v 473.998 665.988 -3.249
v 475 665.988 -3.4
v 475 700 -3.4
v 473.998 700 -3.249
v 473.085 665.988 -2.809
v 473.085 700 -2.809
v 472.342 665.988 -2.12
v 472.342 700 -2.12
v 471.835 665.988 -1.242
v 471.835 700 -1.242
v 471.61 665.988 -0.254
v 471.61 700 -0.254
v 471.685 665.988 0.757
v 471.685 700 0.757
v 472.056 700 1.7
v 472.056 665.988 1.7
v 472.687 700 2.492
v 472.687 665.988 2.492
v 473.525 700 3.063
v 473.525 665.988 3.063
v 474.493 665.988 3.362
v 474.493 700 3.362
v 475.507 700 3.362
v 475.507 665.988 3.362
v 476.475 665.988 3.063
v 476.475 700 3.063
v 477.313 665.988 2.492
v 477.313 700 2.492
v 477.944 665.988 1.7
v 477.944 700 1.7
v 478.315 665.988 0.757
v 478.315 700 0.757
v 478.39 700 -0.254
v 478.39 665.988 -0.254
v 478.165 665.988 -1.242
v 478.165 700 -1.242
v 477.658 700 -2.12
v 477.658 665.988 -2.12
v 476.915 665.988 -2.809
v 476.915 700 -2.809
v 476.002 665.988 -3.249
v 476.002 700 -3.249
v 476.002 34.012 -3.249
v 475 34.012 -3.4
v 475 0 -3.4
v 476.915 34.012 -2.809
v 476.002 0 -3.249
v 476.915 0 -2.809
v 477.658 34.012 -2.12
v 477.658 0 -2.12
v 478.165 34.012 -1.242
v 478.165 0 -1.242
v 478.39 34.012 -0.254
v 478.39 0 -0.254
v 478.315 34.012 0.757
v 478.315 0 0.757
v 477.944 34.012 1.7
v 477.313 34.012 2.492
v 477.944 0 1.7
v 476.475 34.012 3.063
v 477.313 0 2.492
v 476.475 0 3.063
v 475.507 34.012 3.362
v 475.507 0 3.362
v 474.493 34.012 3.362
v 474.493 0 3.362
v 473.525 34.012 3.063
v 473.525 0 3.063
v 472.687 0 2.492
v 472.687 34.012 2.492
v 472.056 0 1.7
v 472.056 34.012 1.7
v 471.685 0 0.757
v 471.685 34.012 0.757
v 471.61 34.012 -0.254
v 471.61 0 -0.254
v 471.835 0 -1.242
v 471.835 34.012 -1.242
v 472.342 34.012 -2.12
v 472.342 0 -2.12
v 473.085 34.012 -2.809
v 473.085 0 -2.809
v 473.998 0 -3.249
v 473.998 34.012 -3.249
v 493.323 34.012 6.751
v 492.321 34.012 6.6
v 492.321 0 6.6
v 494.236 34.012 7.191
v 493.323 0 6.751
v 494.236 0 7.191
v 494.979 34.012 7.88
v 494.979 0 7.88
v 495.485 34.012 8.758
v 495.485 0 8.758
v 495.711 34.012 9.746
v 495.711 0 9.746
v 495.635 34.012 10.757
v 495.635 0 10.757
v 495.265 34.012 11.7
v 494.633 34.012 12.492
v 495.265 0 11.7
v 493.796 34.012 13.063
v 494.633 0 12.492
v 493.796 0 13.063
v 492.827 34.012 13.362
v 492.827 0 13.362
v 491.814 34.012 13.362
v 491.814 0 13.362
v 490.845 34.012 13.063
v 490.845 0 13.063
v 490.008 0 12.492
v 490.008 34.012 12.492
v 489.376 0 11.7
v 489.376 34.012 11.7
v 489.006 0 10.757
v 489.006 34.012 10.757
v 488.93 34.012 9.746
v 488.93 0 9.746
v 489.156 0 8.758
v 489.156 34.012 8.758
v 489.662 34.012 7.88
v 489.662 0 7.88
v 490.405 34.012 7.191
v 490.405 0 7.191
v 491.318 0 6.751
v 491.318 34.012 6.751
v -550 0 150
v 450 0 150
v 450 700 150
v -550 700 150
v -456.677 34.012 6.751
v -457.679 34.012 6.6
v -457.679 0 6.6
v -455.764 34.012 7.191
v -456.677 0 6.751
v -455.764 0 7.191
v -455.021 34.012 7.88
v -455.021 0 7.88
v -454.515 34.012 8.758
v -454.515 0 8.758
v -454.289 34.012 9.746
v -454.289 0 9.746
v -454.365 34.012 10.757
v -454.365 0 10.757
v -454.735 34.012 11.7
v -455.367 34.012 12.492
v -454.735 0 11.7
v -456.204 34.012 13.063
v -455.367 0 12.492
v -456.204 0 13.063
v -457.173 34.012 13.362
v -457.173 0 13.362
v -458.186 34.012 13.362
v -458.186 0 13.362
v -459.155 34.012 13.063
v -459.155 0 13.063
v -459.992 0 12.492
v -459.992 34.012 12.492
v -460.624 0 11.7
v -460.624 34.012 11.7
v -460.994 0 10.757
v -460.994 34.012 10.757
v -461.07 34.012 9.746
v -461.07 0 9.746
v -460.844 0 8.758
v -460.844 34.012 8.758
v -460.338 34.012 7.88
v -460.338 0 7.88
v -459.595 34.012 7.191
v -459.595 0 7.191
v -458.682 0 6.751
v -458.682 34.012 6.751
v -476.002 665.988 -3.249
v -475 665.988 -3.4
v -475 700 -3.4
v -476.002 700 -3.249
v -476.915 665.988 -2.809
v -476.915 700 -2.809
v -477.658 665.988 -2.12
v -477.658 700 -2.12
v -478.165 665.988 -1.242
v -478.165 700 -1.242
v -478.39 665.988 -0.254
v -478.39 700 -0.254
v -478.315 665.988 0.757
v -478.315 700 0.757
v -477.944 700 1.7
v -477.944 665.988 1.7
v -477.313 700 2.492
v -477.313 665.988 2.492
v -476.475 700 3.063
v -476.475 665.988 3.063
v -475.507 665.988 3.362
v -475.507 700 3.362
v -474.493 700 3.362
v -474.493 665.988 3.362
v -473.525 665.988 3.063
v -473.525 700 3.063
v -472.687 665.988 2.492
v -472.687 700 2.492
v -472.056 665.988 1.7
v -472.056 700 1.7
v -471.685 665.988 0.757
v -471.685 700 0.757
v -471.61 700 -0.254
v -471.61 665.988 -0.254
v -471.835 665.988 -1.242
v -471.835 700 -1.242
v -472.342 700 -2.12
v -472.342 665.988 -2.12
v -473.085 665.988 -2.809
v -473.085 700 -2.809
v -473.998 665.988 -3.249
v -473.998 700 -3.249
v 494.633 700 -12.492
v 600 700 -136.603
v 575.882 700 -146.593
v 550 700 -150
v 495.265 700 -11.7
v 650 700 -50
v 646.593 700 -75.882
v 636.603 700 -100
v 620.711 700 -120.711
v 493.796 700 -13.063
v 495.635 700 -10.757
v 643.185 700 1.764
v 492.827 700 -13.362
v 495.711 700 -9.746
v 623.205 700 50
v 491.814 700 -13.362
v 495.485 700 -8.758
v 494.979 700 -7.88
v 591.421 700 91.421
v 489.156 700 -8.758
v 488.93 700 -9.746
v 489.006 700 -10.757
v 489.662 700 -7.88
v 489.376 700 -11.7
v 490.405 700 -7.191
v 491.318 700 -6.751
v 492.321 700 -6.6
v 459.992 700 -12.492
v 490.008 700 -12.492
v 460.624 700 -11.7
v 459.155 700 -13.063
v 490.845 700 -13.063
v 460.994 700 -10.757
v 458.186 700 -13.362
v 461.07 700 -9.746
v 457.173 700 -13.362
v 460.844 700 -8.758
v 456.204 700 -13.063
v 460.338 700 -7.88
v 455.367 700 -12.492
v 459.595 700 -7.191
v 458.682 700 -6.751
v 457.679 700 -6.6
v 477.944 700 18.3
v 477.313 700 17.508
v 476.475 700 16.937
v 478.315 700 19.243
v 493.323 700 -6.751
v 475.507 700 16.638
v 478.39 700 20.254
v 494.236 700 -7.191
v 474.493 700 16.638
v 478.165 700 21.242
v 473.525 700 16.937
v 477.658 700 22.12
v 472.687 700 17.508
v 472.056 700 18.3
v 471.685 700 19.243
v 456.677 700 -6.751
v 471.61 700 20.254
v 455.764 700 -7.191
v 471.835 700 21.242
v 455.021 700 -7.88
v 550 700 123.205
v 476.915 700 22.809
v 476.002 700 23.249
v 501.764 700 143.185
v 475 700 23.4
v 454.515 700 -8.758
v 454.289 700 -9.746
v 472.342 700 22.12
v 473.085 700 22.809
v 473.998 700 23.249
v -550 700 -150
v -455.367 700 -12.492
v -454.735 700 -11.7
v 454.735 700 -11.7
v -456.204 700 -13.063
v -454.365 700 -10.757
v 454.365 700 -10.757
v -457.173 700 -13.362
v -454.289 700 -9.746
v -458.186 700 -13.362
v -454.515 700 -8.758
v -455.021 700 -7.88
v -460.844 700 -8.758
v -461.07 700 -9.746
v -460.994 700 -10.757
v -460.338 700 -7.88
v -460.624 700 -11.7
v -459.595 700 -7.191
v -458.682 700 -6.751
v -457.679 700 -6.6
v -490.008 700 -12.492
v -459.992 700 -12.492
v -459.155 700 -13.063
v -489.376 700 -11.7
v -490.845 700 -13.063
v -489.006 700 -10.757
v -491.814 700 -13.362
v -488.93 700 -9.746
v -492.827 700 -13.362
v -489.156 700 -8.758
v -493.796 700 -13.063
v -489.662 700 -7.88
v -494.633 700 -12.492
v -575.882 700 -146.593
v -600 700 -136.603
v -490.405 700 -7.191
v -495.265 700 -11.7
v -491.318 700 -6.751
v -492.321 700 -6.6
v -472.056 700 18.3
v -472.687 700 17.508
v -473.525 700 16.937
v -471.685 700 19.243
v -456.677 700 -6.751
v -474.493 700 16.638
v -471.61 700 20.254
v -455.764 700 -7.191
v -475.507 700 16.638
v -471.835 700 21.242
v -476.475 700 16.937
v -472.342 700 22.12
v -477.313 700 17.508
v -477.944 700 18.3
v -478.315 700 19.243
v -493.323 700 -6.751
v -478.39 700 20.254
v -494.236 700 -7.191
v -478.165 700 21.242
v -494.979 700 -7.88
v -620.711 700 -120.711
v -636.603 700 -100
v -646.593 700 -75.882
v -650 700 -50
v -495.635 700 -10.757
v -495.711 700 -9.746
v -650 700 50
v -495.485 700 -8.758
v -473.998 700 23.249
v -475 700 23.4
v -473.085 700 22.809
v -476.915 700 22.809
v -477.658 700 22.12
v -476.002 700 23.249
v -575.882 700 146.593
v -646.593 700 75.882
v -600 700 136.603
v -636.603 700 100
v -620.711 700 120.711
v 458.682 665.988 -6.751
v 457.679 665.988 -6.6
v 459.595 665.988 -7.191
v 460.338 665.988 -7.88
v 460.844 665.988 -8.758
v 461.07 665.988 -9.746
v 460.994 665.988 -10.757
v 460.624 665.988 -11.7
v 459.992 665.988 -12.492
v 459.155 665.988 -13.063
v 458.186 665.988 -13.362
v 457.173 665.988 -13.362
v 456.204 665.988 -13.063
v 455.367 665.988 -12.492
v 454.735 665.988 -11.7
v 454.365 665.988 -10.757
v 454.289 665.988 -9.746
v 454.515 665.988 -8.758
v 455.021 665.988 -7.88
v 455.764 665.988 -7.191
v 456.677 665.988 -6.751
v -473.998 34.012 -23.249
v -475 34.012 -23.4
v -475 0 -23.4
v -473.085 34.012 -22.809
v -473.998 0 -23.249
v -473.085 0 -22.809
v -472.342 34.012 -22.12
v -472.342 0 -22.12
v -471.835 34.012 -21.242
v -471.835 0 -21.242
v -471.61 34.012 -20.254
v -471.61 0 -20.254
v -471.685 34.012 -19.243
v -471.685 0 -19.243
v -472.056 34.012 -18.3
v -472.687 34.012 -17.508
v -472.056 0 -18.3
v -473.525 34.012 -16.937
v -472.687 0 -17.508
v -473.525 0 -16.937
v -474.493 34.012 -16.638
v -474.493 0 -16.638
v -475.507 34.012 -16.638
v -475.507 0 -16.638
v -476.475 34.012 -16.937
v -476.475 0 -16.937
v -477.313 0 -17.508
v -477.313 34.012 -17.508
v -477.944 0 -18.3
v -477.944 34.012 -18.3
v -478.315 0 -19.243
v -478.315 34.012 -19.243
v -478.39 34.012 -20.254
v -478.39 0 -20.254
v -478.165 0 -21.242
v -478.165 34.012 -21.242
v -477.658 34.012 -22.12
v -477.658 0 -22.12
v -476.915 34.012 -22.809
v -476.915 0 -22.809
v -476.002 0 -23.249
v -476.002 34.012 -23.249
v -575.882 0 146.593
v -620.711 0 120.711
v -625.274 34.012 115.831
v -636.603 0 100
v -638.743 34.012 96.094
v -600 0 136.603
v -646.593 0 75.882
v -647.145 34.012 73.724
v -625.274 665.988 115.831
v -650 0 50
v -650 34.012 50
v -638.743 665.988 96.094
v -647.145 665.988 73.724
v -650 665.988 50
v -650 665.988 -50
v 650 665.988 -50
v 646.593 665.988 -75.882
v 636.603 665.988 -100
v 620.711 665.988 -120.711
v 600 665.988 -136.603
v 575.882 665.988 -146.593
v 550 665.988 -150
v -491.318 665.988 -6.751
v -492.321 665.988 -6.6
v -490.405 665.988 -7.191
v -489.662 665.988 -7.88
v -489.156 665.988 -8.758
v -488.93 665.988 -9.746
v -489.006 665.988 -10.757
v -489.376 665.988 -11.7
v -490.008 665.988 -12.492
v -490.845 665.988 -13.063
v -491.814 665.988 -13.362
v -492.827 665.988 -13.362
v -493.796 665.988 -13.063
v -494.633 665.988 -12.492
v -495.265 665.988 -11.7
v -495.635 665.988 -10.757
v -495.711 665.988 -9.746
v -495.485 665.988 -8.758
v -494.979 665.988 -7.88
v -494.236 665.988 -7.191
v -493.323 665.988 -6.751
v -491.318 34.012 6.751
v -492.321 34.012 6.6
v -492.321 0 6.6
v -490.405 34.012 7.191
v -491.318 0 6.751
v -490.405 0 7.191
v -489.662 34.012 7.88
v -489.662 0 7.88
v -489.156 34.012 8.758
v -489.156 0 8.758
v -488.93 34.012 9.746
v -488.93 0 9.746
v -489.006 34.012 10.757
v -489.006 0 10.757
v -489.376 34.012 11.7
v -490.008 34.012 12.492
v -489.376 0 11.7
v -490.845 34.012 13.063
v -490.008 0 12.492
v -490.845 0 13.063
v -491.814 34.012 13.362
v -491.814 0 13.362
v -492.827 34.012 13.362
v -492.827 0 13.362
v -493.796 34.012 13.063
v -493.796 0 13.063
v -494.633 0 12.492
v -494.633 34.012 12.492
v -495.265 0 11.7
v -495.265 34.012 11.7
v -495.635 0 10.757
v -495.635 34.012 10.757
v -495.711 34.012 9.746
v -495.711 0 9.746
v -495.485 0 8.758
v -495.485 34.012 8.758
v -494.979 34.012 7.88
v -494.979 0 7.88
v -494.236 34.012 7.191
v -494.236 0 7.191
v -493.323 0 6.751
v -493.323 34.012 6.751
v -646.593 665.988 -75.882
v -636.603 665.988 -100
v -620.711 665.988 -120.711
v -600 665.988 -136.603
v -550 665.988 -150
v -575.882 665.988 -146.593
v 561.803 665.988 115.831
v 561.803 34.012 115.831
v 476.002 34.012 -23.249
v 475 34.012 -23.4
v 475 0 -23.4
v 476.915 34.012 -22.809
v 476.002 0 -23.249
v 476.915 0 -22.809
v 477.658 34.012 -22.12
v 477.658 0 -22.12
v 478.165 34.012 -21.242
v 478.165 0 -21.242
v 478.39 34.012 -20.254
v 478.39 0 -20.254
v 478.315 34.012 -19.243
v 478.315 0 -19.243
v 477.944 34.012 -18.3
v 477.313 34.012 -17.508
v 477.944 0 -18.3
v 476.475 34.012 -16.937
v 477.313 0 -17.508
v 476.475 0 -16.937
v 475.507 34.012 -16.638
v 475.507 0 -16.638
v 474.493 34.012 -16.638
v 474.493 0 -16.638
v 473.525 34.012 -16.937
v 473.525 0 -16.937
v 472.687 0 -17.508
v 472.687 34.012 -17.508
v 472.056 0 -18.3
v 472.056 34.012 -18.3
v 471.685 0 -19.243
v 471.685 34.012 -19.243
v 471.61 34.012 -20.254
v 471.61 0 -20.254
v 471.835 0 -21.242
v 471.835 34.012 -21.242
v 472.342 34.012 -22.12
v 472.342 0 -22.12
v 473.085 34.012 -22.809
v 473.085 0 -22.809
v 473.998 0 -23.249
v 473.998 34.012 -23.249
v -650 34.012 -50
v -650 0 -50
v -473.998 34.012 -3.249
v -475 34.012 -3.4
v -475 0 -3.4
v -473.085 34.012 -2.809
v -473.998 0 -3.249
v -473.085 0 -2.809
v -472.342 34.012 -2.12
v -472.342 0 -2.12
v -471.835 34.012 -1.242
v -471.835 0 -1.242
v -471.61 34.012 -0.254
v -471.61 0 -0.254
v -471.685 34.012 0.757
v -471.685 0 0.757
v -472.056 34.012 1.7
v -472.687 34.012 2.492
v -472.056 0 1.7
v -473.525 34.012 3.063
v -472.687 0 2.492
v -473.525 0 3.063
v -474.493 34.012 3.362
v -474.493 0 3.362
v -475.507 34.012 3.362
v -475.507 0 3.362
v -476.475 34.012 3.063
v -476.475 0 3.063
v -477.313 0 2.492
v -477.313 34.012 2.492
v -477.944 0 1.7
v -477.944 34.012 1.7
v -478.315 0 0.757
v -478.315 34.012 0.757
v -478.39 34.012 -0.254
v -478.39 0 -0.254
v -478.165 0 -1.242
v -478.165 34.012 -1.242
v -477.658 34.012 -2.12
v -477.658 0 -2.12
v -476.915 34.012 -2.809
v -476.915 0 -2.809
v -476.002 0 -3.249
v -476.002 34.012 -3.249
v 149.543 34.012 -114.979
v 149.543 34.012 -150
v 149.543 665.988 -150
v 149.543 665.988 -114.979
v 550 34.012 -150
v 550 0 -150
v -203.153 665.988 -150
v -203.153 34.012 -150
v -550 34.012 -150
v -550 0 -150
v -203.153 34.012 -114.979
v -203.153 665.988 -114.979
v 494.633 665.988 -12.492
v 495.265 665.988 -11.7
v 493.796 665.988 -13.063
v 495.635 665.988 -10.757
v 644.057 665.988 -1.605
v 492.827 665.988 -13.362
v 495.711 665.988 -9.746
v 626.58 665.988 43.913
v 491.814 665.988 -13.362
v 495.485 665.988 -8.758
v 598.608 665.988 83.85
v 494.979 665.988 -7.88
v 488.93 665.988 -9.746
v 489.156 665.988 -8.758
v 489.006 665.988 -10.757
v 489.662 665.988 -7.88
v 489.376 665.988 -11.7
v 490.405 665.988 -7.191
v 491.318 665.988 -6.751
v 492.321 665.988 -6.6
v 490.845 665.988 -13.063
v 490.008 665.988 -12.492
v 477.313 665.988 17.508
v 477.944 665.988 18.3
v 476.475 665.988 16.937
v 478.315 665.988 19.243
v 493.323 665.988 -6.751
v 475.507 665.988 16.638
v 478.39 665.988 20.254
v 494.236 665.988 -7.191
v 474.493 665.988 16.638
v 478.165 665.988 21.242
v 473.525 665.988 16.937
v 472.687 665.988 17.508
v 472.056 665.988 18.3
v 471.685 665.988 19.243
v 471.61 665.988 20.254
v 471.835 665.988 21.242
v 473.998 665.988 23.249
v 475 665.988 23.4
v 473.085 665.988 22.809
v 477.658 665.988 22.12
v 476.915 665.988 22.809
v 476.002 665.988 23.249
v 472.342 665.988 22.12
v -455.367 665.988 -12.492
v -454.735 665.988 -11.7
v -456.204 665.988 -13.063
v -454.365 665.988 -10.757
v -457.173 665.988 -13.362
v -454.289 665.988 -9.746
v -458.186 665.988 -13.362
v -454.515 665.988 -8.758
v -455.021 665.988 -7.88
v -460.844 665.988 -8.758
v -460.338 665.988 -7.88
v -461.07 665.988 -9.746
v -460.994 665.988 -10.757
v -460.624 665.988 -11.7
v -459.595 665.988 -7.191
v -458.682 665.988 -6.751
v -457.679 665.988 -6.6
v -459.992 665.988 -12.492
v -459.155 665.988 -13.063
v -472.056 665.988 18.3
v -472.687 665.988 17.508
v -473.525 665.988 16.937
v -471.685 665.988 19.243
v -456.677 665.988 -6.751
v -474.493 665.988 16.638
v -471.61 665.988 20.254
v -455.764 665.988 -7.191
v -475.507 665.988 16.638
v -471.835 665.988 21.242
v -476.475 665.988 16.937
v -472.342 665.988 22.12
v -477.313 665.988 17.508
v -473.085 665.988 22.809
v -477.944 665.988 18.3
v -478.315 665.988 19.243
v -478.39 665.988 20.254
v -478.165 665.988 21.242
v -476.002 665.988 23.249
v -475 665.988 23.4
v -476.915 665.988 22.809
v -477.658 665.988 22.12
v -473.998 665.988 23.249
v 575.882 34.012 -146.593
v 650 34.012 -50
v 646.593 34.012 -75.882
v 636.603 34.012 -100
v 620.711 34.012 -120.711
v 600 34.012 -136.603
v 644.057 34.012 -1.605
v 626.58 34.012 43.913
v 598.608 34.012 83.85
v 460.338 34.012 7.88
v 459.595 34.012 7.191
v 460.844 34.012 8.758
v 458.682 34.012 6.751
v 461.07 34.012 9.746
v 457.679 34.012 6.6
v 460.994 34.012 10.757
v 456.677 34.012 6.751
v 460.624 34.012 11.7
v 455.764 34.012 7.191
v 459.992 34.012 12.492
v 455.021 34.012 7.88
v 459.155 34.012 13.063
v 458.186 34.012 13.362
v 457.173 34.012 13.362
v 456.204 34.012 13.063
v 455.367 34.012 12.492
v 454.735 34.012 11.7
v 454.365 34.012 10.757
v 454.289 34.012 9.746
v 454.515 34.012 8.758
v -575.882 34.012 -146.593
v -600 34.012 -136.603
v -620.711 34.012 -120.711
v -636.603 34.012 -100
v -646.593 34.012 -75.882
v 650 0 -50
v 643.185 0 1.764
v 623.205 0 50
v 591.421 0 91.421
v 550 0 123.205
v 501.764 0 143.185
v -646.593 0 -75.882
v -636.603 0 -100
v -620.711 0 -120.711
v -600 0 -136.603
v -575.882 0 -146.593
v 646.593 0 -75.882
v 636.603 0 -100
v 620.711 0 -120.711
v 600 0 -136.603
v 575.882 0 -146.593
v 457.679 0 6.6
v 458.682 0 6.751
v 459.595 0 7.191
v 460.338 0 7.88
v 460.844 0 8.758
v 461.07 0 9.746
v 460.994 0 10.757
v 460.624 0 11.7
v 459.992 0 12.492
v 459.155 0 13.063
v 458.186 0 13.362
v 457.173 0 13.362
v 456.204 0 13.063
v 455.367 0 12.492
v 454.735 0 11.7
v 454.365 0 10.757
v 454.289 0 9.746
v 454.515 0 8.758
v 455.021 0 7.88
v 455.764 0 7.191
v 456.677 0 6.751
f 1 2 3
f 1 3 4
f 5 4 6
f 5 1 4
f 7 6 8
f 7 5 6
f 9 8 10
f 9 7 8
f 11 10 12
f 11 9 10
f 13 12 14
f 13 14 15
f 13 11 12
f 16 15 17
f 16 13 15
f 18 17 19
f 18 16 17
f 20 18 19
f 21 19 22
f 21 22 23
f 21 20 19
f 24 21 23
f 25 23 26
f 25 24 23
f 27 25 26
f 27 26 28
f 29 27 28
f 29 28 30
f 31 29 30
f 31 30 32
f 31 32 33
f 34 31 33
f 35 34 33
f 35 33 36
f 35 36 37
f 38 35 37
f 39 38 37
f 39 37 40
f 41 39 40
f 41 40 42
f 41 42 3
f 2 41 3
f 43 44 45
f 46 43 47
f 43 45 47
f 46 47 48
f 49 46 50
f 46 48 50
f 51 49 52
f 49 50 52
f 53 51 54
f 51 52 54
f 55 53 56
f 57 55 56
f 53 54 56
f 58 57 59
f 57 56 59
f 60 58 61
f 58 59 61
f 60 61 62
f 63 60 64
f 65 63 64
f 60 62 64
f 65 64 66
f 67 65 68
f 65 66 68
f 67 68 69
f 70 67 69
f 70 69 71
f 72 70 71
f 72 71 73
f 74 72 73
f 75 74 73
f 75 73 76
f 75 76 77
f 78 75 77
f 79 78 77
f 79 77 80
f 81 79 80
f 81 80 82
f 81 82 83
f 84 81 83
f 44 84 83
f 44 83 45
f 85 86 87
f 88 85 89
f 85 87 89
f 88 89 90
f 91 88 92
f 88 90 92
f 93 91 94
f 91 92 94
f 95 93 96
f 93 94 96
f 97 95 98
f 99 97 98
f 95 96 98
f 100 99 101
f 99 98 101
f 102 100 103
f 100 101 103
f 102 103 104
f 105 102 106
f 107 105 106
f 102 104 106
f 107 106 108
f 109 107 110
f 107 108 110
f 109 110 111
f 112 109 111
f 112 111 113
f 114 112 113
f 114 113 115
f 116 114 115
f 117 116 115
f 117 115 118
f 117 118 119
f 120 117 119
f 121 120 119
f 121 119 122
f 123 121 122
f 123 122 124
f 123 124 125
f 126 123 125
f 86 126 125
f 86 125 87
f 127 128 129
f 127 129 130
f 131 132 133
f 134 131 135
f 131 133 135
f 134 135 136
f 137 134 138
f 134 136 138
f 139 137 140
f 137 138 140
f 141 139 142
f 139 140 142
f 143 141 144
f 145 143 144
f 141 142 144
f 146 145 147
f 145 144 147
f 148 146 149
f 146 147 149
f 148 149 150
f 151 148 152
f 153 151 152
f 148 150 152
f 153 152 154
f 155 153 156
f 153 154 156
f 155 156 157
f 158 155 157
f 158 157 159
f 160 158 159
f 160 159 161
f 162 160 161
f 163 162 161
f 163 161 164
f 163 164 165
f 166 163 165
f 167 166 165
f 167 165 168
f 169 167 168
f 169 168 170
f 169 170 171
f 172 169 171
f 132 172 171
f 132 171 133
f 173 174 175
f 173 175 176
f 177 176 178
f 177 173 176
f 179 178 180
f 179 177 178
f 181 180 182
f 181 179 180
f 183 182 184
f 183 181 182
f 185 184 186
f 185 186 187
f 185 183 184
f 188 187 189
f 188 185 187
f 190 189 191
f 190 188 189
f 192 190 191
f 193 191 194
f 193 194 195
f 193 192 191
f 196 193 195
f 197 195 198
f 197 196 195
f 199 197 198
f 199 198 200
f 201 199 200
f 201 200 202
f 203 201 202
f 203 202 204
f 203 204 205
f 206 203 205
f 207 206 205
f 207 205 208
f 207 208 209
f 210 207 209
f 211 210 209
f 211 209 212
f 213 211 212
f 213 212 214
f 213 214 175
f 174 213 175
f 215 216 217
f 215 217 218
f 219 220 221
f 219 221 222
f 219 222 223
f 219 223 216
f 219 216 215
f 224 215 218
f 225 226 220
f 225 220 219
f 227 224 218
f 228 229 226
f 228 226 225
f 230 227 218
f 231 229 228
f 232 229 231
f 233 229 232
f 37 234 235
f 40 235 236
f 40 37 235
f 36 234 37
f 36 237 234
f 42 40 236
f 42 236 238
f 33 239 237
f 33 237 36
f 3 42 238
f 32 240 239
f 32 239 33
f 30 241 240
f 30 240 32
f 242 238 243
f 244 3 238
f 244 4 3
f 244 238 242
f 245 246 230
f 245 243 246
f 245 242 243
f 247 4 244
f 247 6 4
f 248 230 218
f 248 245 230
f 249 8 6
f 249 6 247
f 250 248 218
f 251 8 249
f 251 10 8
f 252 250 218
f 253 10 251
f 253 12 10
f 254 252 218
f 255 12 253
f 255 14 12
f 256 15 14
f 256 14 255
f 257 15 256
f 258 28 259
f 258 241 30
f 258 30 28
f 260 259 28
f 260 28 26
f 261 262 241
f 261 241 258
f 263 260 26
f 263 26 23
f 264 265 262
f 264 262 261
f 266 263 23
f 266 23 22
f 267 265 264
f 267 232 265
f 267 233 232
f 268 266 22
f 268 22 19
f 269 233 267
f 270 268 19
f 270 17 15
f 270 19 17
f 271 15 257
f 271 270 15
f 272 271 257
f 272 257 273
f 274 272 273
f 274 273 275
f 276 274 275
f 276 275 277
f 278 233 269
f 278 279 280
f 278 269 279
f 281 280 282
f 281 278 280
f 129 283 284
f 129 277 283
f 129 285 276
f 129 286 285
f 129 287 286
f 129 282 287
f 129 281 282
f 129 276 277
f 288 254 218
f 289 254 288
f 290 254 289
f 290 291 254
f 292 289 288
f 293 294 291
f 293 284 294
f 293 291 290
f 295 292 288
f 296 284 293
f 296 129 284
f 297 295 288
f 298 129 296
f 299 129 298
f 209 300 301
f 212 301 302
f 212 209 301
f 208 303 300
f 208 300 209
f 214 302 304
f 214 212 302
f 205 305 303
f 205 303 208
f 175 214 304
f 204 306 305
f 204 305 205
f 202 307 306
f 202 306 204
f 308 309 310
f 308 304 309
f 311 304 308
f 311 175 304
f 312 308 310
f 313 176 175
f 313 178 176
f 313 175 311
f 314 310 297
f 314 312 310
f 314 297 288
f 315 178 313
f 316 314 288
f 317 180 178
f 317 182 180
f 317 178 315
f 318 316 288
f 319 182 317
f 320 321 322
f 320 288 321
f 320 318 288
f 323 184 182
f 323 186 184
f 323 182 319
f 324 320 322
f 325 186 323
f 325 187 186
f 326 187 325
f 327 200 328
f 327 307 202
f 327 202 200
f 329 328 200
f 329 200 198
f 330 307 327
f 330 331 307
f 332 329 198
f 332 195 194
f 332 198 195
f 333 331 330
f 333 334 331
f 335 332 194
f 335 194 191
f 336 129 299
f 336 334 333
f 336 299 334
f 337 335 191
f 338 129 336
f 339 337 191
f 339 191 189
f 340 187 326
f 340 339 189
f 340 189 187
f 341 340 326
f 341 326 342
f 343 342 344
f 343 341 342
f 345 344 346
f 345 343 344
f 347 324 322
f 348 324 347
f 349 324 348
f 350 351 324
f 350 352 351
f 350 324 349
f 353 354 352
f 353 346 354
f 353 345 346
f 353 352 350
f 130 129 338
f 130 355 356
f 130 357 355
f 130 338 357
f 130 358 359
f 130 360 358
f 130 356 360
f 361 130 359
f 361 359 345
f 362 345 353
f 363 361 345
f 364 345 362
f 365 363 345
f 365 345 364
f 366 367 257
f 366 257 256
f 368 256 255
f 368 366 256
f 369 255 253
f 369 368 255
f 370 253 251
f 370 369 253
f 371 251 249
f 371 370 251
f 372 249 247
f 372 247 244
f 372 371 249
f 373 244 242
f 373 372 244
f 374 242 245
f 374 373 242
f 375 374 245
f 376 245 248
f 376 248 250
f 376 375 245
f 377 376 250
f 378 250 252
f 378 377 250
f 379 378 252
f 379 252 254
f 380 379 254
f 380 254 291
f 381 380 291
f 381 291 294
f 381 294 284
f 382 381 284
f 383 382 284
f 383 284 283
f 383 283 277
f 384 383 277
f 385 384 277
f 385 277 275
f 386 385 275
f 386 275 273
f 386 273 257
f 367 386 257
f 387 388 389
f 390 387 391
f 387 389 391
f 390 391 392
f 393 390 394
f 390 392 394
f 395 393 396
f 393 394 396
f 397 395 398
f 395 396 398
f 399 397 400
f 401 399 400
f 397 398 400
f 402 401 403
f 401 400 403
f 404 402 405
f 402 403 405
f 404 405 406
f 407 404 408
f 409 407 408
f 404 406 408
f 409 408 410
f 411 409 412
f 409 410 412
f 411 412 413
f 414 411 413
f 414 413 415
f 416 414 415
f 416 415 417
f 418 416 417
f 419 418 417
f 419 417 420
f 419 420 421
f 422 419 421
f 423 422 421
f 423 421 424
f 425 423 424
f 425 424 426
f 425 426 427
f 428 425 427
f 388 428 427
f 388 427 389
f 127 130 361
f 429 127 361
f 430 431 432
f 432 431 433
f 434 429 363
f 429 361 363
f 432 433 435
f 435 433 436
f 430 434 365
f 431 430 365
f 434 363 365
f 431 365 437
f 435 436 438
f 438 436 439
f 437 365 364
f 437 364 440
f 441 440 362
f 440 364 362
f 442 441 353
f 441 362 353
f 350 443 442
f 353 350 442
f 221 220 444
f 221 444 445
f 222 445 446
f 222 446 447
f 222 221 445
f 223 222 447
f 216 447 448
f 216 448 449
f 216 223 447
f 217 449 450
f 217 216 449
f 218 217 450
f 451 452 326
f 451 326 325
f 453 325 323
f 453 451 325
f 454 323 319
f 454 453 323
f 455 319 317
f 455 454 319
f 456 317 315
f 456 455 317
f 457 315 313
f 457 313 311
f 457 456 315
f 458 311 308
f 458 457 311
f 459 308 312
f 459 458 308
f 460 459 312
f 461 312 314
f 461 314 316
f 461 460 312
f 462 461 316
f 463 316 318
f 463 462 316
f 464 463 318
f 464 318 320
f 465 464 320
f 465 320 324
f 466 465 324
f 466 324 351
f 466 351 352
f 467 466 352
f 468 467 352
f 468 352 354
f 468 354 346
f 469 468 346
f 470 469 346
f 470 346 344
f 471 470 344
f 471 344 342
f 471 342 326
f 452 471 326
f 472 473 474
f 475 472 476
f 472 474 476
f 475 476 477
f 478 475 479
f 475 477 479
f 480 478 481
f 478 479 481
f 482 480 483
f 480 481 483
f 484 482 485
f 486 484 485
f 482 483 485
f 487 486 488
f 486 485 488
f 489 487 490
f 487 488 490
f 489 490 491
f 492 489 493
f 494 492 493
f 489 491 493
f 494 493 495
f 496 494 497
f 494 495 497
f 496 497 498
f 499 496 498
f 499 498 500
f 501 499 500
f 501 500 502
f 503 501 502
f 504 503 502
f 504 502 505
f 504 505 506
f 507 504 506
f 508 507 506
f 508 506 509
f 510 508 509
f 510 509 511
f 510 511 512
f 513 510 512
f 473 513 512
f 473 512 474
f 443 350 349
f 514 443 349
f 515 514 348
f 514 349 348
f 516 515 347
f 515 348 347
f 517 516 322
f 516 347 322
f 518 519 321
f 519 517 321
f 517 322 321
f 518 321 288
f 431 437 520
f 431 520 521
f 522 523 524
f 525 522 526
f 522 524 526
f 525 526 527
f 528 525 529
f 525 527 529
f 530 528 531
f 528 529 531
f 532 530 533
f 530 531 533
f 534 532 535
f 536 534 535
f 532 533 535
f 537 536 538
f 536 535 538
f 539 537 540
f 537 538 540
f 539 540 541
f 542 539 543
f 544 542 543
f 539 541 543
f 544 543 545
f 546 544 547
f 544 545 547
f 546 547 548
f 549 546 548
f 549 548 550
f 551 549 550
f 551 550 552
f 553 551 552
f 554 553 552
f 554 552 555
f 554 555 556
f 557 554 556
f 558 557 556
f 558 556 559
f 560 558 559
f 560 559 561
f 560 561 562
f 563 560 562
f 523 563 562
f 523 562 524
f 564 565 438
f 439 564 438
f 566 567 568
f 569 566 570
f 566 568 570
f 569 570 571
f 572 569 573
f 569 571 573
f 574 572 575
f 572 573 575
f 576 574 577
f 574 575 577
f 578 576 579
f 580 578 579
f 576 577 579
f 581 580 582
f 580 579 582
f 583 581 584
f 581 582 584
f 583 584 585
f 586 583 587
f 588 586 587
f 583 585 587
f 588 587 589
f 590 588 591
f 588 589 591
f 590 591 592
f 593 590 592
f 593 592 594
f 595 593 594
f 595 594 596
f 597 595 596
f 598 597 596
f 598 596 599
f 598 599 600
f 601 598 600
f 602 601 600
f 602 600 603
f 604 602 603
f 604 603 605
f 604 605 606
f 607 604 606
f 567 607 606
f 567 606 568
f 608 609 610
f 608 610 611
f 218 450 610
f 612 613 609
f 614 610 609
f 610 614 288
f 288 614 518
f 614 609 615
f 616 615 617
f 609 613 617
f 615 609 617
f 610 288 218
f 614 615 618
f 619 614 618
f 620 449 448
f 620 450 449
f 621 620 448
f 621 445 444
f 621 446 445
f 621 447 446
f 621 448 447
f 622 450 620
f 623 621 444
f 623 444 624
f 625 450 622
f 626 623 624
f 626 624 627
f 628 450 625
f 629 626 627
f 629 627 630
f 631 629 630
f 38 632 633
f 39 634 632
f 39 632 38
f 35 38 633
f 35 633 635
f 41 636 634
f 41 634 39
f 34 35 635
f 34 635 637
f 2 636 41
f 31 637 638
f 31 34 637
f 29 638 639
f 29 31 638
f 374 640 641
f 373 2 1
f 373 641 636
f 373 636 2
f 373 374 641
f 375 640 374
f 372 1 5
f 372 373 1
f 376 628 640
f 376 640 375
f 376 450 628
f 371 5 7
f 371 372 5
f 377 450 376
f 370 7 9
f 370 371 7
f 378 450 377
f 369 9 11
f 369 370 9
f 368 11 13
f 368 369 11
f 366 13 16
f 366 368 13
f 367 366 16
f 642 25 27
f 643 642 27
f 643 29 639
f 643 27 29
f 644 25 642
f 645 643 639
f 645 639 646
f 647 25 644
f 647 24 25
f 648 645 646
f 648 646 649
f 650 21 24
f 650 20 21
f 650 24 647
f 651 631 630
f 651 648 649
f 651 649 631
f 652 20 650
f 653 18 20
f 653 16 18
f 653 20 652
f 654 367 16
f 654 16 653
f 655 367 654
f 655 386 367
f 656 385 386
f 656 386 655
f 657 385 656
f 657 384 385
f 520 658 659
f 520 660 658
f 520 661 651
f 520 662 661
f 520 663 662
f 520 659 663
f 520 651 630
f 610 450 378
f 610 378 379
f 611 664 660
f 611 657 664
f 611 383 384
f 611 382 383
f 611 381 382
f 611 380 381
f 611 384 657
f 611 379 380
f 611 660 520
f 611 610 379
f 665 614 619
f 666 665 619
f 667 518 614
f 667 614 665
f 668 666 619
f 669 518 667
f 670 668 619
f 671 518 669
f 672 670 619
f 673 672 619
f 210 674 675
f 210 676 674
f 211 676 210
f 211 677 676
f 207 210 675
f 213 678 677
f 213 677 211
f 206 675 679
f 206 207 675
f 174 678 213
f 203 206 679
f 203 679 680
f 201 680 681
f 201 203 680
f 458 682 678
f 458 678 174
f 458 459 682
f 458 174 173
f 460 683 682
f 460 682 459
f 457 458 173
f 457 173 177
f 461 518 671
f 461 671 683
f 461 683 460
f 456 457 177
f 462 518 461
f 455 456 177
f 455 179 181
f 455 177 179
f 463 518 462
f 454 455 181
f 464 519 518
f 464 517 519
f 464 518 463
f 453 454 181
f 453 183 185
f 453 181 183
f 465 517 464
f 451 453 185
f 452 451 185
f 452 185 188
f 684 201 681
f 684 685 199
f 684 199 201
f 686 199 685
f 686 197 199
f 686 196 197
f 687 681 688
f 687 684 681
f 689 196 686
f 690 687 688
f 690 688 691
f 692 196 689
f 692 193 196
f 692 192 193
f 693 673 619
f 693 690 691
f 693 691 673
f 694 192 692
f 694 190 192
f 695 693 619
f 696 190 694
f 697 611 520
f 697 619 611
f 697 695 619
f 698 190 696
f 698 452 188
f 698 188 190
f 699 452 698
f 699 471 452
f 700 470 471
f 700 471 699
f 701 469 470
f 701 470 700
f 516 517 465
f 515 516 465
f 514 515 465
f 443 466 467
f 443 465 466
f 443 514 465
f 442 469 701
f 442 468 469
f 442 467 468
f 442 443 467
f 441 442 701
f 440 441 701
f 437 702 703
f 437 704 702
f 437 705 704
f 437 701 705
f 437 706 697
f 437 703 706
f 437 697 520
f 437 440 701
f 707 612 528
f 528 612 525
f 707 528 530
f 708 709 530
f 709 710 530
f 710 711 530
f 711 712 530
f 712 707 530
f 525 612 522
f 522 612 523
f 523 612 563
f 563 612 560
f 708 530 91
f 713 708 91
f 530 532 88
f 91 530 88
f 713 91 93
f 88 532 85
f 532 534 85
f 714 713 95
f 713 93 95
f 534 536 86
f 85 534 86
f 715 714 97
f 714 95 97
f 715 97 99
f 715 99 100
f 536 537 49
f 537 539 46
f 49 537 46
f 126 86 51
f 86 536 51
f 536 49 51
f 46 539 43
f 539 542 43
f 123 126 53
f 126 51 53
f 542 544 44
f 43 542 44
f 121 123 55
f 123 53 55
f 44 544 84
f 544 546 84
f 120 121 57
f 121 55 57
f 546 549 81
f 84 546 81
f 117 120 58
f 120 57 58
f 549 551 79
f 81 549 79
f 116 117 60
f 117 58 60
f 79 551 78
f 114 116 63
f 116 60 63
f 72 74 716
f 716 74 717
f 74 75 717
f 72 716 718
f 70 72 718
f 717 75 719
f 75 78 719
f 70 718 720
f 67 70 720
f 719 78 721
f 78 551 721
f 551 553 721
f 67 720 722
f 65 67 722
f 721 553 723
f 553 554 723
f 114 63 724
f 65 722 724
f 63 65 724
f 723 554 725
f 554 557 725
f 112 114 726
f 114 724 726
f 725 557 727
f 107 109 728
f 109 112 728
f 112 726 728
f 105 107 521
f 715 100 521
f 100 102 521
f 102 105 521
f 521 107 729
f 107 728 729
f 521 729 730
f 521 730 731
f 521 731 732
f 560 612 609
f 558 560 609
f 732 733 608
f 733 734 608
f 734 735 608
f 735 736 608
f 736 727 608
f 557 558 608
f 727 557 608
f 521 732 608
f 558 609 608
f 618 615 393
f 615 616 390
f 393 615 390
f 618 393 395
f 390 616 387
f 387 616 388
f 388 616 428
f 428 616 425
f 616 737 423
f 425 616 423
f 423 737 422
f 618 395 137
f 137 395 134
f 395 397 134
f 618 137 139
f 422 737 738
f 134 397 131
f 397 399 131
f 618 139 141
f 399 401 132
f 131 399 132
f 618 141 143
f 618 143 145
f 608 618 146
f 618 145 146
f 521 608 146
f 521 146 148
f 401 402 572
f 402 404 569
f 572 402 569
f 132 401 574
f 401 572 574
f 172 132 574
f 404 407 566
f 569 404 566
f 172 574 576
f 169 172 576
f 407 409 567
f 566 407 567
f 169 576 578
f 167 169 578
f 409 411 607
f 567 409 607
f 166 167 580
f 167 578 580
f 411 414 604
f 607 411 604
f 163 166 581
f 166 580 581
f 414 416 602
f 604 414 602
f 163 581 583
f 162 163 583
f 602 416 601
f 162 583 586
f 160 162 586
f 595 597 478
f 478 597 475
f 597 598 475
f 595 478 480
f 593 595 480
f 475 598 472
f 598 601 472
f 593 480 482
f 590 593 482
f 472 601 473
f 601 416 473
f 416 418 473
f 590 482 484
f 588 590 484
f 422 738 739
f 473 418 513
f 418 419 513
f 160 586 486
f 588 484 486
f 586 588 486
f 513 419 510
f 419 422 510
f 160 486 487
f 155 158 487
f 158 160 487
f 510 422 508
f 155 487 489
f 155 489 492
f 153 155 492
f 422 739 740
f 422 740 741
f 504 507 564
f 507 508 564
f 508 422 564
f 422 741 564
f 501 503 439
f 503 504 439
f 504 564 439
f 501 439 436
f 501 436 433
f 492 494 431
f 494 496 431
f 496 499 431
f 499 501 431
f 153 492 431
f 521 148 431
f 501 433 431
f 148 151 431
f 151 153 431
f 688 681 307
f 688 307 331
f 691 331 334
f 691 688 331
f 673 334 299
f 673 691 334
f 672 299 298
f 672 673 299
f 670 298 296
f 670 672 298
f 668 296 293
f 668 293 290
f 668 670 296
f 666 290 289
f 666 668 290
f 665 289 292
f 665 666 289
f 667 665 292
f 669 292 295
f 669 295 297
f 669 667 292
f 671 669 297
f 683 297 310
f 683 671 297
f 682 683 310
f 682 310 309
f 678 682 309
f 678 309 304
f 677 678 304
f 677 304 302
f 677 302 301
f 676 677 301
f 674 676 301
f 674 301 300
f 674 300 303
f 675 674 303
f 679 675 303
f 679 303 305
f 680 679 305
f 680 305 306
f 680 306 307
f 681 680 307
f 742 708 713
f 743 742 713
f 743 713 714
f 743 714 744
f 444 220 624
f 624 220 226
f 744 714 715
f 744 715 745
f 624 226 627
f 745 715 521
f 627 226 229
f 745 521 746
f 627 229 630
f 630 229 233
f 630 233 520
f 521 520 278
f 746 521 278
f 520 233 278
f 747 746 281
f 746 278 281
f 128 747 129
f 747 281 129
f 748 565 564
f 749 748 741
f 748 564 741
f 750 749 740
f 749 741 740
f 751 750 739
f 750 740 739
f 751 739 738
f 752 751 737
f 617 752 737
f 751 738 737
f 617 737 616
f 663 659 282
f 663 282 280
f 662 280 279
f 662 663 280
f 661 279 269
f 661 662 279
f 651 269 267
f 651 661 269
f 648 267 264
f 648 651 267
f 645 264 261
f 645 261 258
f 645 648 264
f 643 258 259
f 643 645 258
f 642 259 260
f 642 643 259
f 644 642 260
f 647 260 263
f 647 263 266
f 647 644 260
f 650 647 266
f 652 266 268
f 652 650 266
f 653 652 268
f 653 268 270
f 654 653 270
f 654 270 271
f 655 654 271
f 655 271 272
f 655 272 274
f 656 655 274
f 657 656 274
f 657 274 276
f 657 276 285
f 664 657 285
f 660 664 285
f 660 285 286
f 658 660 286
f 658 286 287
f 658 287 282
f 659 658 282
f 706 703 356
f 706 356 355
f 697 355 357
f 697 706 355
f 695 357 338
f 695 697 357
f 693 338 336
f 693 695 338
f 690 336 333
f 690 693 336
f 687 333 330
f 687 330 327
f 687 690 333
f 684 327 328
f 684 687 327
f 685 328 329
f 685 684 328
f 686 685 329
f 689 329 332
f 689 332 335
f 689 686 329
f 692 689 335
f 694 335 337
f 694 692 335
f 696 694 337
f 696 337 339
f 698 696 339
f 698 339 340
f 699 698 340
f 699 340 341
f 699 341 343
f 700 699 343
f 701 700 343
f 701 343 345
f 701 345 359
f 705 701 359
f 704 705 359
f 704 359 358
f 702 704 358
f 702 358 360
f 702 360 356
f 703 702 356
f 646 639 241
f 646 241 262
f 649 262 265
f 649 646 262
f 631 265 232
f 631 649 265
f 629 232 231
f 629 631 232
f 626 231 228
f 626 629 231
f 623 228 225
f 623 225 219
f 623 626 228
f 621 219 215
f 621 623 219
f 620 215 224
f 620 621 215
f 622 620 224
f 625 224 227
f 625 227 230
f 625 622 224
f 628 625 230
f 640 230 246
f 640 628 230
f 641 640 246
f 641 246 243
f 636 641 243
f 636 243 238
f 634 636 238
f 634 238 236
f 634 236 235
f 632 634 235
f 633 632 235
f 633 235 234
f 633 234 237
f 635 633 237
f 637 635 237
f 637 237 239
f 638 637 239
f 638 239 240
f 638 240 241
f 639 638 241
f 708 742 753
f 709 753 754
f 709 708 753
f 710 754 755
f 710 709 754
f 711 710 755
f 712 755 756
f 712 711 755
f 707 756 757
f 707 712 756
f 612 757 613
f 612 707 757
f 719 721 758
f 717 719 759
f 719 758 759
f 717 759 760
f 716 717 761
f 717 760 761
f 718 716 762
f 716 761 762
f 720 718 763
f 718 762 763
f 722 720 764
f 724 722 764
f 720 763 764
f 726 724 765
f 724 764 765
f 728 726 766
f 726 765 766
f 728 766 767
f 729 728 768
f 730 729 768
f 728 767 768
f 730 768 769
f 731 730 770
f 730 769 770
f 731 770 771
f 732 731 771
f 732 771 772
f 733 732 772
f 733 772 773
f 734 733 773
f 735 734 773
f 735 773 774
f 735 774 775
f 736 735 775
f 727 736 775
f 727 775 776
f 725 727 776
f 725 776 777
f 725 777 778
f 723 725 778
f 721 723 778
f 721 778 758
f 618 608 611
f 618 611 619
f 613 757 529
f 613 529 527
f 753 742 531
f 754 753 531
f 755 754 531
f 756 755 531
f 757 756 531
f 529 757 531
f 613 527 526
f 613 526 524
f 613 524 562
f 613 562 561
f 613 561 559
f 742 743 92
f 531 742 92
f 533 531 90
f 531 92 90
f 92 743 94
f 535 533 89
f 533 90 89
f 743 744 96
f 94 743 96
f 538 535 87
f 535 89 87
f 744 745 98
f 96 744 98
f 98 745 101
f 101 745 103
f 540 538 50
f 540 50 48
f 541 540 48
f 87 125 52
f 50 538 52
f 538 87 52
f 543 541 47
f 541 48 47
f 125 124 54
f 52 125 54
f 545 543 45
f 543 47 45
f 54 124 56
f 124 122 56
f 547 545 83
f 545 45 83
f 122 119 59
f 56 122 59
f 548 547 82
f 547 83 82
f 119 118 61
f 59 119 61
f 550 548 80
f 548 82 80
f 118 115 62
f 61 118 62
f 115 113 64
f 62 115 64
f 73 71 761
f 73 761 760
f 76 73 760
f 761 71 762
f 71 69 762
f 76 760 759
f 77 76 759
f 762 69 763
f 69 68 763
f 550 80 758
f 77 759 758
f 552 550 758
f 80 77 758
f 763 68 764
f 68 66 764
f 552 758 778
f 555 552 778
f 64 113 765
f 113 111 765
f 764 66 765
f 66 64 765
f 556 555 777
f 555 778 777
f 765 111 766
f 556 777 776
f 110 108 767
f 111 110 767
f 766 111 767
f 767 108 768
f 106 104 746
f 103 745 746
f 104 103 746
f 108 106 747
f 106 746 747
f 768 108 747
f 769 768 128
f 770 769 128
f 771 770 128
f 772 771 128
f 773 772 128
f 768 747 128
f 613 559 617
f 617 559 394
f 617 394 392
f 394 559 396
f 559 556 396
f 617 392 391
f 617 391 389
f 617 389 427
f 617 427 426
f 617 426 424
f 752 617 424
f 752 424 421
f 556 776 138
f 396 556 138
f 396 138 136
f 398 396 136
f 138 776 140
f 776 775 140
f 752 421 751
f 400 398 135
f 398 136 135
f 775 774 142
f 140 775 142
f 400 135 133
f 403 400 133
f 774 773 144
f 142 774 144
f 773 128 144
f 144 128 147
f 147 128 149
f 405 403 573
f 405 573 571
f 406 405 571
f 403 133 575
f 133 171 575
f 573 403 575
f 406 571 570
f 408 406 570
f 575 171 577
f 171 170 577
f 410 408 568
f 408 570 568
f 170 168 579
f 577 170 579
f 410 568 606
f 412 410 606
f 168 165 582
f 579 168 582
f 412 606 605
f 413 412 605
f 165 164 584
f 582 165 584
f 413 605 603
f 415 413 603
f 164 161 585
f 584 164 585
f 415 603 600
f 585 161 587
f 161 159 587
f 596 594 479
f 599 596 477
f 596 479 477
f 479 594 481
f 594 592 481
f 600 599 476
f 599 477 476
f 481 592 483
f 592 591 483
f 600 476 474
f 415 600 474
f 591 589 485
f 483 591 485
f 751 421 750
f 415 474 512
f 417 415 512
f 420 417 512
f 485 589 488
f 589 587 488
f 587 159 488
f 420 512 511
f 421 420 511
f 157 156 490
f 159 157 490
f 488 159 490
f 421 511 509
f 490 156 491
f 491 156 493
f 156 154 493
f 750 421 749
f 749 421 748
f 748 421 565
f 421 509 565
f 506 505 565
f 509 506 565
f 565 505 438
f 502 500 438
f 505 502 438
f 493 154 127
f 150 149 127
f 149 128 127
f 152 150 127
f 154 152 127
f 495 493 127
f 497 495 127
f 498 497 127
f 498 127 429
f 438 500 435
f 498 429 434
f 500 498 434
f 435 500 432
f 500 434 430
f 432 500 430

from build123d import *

# Parameters (mm, degrees)
SKETCH1_W           = 1300
SKETCH1_H           = 300
BOSS_EXTRUDE1_DEPTH = 700
FILLET1_R           = 200
FILLET2_R           = 100
FILLET3_R           = 100
FILLET4_R           = 100
SKETCH3_R           = 3.4
CUT_EXTRUDE1_DEPTH  = 100
CUT_EXTRUDE2_START  = -100
SKETCH4_R           = 3.4
CUT_EXTRUDE2_DEPTH  = 100
SKETCH5_W           = 631.976111166
SKETCH5_H           = 319.581114146
CUT_EXTRUDE4_DEPTH  = 1410
SKETCH6_W           = 352.69600487
SKETCH6_H           = 35.021102412
BOSS_EXTRUDE2_DEPTH = 631.976111165


with BuildPart() as part:
    # Sketch1 → Boss-Extrude1 (new body)
    with BuildSketch(Plane(origin=(0, 0, 0), x_dir=(-1, 0, 0), z_dir=(0, 1, 0))):
        Rectangle(SKETCH1_W, SKETCH1_H)
    extrude(amount=BOSS_EXTRUDE1_DEPTH)

    # Fillet1
    fillet1_edges = [part.edges().sort_by_distance(p)[0] for p in [
        (650, 350, 150),
    ]]
    fillet(fillet1_edges, radius=FILLET1_R)

    # Fillet2
    fillet2_edges = [part.edges().sort_by_distance(p)[0] for p in [
        (650, 350, -150),
    ]]
    fillet(fillet2_edges, radius=FILLET2_R - 0.0001)  # a hair under: the kernel refuses the full size

    # Fillet3
    fillet3_edges = [part.edges().sort_by_distance(p)[0] for p in [
        (-650, 350, 150),
    ]]
    fillet(fillet3_edges, radius=FILLET3_R)

    # Fillet4
    fillet4_edges = [part.edges().sort_by_distance(p)[0] for p in [
        (-650, 350, -150),
    ]]
    fillet(fillet4_edges, radius=FILLET4_R)

    # Sketch3 → Cut-Extrude1 (cut)
    with BuildSketch(Plane.XZ):
        with Locations(Location((475, 0, 0), (0, 0, 270))):
            Circle(SKETCH3_R)
        with Locations(Location((492.320508076, 10, 0), (0, 0, 270))):
            Circle(SKETCH3_R)
        with Locations(Location((457.679491924, 10, 0), (0, 0, 270))):
            Circle(SKETCH3_R)
        with Locations(Location((475, -20, 0), (0, 0, 270))):
            Circle(SKETCH3_R)
        with Locations(Location((-475, 0, 0), (0, 0, 270))):
            Circle(SKETCH3_R)
        with Locations(Location((-457.679491924, 10, 0), (0, 0, 270))):
            Circle(SKETCH3_R)
        with Locations(Location((-492.320508076, 10, 0), (0, 0, 270))):
            Circle(SKETCH3_R)
        with Locations(Location((-475, -20, 0), (0, 0, 270))):
            Circle(SKETCH3_R)
    extrude(amount=-CUT_EXTRUDE1_DEPTH, mode=Mode.SUBTRACT)

    # Sketch4 → Cut-Extrude2 (cut)
    with BuildSketch(Plane(origin=(0, 700, 0), x_dir=(-1, 0, 0), z_dir=(0, 1, 0)).offset(CUT_EXTRUDE2_START)):
        with Locations(Location((-475, 0, 0), (0, 0, 270))):
            Circle(SKETCH4_R)
        with Locations(Location((-475, 20, 0), (0, 0, 90))):
            Circle(SKETCH4_R)
        with Locations(Location((-492.320508076, -10, 0), (0, 0, 90))):
            Circle(SKETCH4_R)
        with Locations(Location((-457.679491924, -10, 0), (0, 0, 90))):
            Circle(SKETCH4_R)
        with Locations(Location((475, 0, 0), (0, 0, 270))):
            Circle(SKETCH4_R)
        with Locations(Location((475, 20, 0), (0, 0, 90))):
            Circle(SKETCH4_R)
        with Locations(Location((457.679491924, -10, 0), (0, 0, 90))):
            Circle(SKETCH4_R)
        with Locations(Location((492.320508076, -10, 0), (0, 0, 90))):
            Circle(SKETCH4_R)
    extrude(amount=CUT_EXTRUDE2_DEPTH, mode=Mode.SUBTRACT)

    # Sketch5 → Cut-Extrude4 (cut)
    with BuildSketch(Plane(origin=(-650, 0, 0), x_dir=(0, -1, 0), z_dir=(-1, 0, 0))):
        with Locations((-350, -43.959211894)):
            Rectangle(SKETCH5_W, SKETCH5_H)
    extrude(amount=-CUT_EXTRUDE4_DEPTH, mode=Mode.SUBTRACT)

    # Sketch6 → Boss-Extrude2 (add)
    with BuildSketch(Plane(origin=(0, 34.011944417, 0), x_dir=(-1, 0, 0), z_dir=(0, 1, 0))):
        with Locations((26.80489637, -132.489448794)):
            Rectangle(SKETCH6_W, SKETCH6_H)
    extrude(amount=BOSS_EXTRUDE2_DEPTH)


solid = part.part
